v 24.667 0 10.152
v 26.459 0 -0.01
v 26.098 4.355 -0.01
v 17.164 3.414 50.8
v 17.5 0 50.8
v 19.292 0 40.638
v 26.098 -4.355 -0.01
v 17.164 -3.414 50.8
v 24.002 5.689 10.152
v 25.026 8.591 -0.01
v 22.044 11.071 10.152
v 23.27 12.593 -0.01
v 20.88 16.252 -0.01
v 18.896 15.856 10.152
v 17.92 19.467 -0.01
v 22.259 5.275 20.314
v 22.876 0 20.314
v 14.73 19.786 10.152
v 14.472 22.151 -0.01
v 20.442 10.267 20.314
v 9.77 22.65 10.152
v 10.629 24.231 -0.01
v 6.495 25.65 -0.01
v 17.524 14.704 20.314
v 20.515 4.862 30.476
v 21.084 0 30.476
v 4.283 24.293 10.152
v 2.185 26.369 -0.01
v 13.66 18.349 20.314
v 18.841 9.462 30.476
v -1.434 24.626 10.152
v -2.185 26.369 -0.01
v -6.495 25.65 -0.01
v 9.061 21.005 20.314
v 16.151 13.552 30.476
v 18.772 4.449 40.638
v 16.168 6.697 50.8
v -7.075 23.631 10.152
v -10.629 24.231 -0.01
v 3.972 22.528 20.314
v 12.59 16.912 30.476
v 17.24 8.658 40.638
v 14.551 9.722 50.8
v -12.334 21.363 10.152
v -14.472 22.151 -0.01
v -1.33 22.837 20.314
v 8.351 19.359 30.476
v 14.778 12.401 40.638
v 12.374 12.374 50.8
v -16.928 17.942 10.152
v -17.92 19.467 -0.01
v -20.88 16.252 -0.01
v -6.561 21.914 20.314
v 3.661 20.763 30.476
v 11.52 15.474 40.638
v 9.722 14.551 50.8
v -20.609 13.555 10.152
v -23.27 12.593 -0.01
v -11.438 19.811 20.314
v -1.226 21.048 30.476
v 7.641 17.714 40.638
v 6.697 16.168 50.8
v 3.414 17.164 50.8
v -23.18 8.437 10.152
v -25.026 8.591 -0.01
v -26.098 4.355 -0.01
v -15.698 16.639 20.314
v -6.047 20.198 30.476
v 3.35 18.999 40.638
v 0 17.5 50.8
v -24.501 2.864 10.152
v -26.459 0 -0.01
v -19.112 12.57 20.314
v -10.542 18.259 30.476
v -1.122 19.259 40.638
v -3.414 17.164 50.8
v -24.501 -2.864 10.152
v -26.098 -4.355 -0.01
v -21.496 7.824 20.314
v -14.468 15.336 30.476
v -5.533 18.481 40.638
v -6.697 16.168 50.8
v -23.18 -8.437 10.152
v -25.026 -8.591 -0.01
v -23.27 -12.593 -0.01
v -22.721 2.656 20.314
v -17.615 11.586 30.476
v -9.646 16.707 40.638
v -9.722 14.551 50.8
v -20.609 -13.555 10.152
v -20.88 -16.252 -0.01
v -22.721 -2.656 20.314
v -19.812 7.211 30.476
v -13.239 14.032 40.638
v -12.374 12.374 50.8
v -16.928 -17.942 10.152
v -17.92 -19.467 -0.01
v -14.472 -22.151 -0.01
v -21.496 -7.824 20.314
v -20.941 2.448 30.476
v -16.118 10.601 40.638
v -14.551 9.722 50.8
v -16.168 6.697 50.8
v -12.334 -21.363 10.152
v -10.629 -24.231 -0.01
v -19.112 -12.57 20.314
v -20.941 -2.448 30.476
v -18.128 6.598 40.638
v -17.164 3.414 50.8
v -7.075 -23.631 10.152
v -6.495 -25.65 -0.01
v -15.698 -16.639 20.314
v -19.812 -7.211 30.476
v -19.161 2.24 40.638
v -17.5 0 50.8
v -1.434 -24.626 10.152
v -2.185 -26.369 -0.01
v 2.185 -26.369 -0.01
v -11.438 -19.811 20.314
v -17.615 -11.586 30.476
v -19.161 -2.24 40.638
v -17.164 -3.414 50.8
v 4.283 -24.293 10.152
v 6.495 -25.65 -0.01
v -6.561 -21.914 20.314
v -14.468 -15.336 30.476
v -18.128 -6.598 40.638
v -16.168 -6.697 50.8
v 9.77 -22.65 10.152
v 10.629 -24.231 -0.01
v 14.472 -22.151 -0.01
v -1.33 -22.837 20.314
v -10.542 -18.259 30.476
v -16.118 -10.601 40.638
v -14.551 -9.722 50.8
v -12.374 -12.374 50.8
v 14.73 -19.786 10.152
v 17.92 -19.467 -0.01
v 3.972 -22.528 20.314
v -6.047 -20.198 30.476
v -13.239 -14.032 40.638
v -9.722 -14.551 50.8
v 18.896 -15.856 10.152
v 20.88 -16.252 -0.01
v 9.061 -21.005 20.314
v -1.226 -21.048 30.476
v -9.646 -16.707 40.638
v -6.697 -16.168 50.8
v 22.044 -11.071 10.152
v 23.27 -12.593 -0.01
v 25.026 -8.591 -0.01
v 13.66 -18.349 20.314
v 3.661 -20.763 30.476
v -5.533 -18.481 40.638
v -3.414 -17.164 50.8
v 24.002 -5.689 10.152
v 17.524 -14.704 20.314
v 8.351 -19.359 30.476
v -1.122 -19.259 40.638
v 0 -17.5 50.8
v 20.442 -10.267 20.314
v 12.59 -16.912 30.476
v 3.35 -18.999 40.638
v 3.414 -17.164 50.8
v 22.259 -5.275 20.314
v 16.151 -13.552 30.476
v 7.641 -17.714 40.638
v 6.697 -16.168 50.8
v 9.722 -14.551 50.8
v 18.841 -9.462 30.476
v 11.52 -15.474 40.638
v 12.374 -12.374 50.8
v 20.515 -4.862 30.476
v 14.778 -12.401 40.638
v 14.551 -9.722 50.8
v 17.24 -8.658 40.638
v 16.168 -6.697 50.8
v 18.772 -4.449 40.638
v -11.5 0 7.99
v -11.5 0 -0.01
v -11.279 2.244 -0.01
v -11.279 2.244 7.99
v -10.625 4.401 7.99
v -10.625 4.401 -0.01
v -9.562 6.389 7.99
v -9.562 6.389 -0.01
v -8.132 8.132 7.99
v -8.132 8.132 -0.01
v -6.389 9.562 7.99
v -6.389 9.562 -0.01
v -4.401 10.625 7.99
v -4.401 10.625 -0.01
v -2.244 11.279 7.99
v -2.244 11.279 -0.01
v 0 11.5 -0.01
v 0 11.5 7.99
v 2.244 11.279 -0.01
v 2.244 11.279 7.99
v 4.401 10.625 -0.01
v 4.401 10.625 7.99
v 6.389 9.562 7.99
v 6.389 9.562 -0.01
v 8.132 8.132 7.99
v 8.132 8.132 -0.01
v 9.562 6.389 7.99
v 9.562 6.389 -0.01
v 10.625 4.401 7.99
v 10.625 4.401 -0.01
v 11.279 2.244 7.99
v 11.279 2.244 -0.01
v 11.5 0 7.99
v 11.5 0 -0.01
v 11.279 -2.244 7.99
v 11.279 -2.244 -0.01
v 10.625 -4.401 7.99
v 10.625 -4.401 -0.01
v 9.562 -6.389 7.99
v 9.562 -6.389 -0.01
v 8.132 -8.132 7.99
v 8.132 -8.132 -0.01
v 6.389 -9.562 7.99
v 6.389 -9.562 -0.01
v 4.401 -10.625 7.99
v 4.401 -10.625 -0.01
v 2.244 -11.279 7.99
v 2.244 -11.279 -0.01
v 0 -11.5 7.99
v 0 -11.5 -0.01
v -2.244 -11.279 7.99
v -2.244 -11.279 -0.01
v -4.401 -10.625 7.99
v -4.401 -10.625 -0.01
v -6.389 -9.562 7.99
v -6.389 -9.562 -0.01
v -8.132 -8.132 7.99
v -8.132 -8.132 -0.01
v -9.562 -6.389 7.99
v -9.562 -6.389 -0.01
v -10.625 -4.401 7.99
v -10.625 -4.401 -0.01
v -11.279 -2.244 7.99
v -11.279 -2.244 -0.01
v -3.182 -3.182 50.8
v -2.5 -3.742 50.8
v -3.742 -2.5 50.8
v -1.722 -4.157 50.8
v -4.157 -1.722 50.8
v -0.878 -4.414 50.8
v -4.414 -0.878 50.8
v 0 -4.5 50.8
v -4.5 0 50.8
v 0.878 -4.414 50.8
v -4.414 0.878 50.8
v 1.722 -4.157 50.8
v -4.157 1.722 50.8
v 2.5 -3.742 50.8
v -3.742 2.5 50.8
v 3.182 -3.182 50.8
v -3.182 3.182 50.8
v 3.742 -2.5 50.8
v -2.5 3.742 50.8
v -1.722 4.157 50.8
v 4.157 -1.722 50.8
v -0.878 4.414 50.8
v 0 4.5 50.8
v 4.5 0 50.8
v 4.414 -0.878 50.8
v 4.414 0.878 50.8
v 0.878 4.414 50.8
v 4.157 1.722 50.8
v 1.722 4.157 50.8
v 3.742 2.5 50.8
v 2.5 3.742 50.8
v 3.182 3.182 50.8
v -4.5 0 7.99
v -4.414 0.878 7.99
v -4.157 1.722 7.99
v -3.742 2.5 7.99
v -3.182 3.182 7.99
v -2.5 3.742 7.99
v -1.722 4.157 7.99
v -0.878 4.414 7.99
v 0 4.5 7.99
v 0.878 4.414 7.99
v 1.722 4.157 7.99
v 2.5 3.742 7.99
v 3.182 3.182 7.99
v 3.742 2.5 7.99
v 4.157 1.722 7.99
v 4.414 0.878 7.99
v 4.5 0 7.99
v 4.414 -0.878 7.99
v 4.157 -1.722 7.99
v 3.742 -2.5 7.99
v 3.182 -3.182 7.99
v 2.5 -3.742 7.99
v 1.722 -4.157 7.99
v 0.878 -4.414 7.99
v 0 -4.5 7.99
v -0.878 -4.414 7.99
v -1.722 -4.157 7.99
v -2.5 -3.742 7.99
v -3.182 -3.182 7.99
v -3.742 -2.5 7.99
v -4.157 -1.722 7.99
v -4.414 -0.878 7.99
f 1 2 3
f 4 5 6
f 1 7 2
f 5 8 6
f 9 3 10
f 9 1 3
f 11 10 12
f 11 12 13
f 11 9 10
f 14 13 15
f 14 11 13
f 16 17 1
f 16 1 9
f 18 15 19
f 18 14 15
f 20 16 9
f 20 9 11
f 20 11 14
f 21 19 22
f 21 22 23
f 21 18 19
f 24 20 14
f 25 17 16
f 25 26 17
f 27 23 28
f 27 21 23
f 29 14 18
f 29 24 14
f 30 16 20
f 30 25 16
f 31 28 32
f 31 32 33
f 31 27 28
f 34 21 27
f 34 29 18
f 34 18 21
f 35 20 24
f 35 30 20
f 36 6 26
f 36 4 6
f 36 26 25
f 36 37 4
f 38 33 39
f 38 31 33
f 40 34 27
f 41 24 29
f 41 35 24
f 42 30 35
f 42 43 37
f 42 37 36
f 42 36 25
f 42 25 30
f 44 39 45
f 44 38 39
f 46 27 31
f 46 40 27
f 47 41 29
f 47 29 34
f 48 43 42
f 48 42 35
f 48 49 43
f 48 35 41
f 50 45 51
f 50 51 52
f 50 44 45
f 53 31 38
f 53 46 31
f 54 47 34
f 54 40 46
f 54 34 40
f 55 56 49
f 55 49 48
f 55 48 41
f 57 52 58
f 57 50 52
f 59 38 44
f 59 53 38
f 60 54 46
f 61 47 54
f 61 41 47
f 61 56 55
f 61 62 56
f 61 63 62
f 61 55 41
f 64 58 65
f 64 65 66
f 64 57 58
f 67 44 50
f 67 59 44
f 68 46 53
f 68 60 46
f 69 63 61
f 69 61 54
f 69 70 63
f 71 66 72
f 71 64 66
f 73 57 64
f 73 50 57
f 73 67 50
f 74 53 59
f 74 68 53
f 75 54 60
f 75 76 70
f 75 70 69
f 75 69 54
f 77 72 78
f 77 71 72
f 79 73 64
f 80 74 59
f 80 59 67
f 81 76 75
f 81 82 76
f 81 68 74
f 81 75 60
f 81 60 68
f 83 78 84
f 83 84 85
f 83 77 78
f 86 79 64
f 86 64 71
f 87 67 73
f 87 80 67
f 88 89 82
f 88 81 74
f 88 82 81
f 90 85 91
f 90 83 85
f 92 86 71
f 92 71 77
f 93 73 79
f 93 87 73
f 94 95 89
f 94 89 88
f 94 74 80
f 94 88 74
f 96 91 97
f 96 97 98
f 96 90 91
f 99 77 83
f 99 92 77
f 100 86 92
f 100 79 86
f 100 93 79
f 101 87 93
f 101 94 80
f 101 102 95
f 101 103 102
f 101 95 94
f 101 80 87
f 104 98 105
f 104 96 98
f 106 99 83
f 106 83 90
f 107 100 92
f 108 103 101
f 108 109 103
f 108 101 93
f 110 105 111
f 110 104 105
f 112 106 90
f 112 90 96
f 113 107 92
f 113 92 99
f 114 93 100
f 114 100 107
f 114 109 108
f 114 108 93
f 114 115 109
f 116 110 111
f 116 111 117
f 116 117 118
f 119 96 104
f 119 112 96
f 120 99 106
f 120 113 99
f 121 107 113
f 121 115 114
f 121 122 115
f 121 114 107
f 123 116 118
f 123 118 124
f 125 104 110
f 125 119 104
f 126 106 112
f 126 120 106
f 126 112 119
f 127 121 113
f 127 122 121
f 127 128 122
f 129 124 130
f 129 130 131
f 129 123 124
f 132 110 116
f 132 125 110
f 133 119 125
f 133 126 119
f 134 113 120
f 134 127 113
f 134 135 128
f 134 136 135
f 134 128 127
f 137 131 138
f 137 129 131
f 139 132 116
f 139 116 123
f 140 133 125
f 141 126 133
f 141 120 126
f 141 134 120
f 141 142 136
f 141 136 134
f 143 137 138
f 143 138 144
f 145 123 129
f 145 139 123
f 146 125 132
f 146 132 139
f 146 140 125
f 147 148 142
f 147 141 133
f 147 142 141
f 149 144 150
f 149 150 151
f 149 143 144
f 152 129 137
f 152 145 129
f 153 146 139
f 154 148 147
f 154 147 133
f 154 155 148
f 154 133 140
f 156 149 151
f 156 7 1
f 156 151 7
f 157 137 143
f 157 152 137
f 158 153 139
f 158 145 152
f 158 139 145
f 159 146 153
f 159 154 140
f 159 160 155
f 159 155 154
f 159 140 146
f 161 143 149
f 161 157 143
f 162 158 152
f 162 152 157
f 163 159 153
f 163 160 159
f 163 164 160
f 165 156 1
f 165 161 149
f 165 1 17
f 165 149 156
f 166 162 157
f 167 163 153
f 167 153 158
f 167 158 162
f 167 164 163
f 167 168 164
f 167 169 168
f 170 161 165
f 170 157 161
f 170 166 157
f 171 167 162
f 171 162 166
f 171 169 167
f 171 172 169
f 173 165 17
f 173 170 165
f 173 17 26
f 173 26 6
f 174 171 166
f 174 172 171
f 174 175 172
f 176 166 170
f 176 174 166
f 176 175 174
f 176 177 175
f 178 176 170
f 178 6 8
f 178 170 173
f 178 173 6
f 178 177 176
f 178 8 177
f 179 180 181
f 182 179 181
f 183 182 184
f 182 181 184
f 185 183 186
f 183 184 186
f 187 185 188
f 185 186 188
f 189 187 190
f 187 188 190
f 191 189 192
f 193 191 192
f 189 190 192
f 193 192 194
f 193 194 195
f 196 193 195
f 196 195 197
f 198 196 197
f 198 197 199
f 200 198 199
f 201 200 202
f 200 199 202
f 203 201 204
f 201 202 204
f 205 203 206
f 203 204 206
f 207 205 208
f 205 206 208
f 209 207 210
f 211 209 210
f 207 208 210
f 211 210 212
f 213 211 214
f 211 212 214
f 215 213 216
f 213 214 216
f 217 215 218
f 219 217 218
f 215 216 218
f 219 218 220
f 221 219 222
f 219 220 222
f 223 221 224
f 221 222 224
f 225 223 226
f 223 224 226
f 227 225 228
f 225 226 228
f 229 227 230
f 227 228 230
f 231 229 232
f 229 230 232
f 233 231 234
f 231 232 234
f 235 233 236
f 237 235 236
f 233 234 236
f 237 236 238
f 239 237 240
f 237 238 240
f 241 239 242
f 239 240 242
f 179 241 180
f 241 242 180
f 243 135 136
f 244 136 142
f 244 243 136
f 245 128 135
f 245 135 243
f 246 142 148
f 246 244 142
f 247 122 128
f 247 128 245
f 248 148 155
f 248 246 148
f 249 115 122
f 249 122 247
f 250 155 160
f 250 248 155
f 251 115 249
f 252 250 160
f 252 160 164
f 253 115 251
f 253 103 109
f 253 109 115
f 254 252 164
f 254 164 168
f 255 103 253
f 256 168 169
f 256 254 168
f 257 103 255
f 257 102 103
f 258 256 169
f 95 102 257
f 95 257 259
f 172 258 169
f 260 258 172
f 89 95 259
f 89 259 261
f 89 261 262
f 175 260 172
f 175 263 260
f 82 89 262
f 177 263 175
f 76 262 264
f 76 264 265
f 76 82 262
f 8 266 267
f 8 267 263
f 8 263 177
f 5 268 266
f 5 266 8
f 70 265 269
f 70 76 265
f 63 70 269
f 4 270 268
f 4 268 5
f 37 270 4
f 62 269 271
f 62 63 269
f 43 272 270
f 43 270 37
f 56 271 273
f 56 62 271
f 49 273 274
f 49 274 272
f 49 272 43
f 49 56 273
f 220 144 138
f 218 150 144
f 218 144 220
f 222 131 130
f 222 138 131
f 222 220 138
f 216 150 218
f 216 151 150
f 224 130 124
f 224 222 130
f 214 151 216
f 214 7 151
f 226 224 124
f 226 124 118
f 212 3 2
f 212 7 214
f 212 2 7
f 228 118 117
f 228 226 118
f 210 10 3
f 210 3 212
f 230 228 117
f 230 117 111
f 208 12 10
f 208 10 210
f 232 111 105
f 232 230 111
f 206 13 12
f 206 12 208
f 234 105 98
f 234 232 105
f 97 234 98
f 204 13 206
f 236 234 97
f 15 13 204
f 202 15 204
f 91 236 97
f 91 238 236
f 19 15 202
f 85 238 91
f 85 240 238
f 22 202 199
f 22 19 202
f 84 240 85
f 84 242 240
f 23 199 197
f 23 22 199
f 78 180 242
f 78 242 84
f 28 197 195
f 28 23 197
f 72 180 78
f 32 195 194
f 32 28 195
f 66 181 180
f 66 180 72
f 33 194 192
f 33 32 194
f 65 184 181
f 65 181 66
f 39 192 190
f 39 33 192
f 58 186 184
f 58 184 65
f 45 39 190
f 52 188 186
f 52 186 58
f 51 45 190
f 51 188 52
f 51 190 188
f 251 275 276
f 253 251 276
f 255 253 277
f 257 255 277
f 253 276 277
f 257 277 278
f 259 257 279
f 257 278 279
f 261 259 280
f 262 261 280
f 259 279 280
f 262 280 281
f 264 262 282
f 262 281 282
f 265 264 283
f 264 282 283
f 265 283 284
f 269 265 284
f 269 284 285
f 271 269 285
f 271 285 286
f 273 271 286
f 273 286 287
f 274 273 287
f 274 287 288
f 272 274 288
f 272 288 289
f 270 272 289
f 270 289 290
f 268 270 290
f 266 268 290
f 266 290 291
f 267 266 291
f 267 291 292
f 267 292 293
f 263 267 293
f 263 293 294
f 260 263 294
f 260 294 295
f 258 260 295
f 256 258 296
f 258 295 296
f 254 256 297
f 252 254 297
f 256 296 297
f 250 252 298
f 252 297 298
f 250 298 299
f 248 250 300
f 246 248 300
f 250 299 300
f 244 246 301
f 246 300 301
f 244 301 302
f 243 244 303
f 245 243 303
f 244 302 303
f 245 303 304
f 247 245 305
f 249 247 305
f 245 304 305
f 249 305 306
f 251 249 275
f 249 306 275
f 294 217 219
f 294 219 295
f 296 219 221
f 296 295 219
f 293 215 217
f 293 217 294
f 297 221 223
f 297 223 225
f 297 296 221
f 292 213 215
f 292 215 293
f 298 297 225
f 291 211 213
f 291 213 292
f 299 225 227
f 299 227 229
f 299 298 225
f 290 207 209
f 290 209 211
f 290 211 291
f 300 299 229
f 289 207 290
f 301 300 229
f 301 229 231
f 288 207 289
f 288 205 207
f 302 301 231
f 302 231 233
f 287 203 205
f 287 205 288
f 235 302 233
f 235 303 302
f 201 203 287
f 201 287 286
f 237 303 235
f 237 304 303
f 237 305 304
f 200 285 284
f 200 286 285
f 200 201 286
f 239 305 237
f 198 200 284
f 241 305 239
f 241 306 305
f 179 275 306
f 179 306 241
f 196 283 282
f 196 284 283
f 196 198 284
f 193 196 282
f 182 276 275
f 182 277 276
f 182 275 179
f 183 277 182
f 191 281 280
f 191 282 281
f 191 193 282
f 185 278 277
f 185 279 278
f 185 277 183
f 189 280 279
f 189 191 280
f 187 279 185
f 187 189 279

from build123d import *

# Parameters (mm, degrees)
BOSS_EXTRUDE_DEPTH      = 50.8
BOSS_EXTRUDE_DEPTH_BACK = 0.01
SKETCH1_R               = 17.5
SKETCH2_R               = 4.5
CUT_EXTRUDE1_DEPTH      = 64.101758025
SKETCH3_R               = 11.5
CUT_EXTRUDE3_DEPTH      = 8


# Read off the part's stored shape, not the designer's step: Draft3
with BuildPart() as part:
    # Sketch1 → Boss-Extrude (new, two sides: drawn at the far end of the back side and taken through both)
    with BuildSketch(Plane.XY.offset(-BOSS_EXTRUDE_DEPTH_BACK)):
        Circle(SKETCH1_R)
    extrude(amount=BOSS_EXTRUDE_DEPTH + BOSS_EXTRUDE_DEPTH_BACK)

    # Draft3 outline → Draft3 (revolve)
    with BuildSketch(Plane.XZ):
        Polygon((26.45917389, -0.01), (17.5, 50.8), (17.5, -0.01), align=None)
    revolve(axis=Axis((0, 0, 0), (0, 0, 1)))

    # Sketch2 → Cut-Extrude1 (cut, through all)
    with BuildSketch(Plane(origin=(0, 0, -0.01), x_dir=(-1, 0, 0), z_dir=(0, 0, -1))):
        Circle(SKETCH2_R)
    extrude(amount=-CUT_EXTRUDE1_DEPTH, mode=Mode.SUBTRACT)

    # Sketch3 → Cut-Extrude3 (cut)
    with BuildSketch(Plane(origin=(0, 0, -0.01), x_dir=(-1, 0, 0), z_dir=(0, 0, -1))):
        Circle(SKETCH3_R)
    extrude(amount=-CUT_EXTRUDE3_DEPTH, mode=Mode.SUBTRACT)


solid = part.part
